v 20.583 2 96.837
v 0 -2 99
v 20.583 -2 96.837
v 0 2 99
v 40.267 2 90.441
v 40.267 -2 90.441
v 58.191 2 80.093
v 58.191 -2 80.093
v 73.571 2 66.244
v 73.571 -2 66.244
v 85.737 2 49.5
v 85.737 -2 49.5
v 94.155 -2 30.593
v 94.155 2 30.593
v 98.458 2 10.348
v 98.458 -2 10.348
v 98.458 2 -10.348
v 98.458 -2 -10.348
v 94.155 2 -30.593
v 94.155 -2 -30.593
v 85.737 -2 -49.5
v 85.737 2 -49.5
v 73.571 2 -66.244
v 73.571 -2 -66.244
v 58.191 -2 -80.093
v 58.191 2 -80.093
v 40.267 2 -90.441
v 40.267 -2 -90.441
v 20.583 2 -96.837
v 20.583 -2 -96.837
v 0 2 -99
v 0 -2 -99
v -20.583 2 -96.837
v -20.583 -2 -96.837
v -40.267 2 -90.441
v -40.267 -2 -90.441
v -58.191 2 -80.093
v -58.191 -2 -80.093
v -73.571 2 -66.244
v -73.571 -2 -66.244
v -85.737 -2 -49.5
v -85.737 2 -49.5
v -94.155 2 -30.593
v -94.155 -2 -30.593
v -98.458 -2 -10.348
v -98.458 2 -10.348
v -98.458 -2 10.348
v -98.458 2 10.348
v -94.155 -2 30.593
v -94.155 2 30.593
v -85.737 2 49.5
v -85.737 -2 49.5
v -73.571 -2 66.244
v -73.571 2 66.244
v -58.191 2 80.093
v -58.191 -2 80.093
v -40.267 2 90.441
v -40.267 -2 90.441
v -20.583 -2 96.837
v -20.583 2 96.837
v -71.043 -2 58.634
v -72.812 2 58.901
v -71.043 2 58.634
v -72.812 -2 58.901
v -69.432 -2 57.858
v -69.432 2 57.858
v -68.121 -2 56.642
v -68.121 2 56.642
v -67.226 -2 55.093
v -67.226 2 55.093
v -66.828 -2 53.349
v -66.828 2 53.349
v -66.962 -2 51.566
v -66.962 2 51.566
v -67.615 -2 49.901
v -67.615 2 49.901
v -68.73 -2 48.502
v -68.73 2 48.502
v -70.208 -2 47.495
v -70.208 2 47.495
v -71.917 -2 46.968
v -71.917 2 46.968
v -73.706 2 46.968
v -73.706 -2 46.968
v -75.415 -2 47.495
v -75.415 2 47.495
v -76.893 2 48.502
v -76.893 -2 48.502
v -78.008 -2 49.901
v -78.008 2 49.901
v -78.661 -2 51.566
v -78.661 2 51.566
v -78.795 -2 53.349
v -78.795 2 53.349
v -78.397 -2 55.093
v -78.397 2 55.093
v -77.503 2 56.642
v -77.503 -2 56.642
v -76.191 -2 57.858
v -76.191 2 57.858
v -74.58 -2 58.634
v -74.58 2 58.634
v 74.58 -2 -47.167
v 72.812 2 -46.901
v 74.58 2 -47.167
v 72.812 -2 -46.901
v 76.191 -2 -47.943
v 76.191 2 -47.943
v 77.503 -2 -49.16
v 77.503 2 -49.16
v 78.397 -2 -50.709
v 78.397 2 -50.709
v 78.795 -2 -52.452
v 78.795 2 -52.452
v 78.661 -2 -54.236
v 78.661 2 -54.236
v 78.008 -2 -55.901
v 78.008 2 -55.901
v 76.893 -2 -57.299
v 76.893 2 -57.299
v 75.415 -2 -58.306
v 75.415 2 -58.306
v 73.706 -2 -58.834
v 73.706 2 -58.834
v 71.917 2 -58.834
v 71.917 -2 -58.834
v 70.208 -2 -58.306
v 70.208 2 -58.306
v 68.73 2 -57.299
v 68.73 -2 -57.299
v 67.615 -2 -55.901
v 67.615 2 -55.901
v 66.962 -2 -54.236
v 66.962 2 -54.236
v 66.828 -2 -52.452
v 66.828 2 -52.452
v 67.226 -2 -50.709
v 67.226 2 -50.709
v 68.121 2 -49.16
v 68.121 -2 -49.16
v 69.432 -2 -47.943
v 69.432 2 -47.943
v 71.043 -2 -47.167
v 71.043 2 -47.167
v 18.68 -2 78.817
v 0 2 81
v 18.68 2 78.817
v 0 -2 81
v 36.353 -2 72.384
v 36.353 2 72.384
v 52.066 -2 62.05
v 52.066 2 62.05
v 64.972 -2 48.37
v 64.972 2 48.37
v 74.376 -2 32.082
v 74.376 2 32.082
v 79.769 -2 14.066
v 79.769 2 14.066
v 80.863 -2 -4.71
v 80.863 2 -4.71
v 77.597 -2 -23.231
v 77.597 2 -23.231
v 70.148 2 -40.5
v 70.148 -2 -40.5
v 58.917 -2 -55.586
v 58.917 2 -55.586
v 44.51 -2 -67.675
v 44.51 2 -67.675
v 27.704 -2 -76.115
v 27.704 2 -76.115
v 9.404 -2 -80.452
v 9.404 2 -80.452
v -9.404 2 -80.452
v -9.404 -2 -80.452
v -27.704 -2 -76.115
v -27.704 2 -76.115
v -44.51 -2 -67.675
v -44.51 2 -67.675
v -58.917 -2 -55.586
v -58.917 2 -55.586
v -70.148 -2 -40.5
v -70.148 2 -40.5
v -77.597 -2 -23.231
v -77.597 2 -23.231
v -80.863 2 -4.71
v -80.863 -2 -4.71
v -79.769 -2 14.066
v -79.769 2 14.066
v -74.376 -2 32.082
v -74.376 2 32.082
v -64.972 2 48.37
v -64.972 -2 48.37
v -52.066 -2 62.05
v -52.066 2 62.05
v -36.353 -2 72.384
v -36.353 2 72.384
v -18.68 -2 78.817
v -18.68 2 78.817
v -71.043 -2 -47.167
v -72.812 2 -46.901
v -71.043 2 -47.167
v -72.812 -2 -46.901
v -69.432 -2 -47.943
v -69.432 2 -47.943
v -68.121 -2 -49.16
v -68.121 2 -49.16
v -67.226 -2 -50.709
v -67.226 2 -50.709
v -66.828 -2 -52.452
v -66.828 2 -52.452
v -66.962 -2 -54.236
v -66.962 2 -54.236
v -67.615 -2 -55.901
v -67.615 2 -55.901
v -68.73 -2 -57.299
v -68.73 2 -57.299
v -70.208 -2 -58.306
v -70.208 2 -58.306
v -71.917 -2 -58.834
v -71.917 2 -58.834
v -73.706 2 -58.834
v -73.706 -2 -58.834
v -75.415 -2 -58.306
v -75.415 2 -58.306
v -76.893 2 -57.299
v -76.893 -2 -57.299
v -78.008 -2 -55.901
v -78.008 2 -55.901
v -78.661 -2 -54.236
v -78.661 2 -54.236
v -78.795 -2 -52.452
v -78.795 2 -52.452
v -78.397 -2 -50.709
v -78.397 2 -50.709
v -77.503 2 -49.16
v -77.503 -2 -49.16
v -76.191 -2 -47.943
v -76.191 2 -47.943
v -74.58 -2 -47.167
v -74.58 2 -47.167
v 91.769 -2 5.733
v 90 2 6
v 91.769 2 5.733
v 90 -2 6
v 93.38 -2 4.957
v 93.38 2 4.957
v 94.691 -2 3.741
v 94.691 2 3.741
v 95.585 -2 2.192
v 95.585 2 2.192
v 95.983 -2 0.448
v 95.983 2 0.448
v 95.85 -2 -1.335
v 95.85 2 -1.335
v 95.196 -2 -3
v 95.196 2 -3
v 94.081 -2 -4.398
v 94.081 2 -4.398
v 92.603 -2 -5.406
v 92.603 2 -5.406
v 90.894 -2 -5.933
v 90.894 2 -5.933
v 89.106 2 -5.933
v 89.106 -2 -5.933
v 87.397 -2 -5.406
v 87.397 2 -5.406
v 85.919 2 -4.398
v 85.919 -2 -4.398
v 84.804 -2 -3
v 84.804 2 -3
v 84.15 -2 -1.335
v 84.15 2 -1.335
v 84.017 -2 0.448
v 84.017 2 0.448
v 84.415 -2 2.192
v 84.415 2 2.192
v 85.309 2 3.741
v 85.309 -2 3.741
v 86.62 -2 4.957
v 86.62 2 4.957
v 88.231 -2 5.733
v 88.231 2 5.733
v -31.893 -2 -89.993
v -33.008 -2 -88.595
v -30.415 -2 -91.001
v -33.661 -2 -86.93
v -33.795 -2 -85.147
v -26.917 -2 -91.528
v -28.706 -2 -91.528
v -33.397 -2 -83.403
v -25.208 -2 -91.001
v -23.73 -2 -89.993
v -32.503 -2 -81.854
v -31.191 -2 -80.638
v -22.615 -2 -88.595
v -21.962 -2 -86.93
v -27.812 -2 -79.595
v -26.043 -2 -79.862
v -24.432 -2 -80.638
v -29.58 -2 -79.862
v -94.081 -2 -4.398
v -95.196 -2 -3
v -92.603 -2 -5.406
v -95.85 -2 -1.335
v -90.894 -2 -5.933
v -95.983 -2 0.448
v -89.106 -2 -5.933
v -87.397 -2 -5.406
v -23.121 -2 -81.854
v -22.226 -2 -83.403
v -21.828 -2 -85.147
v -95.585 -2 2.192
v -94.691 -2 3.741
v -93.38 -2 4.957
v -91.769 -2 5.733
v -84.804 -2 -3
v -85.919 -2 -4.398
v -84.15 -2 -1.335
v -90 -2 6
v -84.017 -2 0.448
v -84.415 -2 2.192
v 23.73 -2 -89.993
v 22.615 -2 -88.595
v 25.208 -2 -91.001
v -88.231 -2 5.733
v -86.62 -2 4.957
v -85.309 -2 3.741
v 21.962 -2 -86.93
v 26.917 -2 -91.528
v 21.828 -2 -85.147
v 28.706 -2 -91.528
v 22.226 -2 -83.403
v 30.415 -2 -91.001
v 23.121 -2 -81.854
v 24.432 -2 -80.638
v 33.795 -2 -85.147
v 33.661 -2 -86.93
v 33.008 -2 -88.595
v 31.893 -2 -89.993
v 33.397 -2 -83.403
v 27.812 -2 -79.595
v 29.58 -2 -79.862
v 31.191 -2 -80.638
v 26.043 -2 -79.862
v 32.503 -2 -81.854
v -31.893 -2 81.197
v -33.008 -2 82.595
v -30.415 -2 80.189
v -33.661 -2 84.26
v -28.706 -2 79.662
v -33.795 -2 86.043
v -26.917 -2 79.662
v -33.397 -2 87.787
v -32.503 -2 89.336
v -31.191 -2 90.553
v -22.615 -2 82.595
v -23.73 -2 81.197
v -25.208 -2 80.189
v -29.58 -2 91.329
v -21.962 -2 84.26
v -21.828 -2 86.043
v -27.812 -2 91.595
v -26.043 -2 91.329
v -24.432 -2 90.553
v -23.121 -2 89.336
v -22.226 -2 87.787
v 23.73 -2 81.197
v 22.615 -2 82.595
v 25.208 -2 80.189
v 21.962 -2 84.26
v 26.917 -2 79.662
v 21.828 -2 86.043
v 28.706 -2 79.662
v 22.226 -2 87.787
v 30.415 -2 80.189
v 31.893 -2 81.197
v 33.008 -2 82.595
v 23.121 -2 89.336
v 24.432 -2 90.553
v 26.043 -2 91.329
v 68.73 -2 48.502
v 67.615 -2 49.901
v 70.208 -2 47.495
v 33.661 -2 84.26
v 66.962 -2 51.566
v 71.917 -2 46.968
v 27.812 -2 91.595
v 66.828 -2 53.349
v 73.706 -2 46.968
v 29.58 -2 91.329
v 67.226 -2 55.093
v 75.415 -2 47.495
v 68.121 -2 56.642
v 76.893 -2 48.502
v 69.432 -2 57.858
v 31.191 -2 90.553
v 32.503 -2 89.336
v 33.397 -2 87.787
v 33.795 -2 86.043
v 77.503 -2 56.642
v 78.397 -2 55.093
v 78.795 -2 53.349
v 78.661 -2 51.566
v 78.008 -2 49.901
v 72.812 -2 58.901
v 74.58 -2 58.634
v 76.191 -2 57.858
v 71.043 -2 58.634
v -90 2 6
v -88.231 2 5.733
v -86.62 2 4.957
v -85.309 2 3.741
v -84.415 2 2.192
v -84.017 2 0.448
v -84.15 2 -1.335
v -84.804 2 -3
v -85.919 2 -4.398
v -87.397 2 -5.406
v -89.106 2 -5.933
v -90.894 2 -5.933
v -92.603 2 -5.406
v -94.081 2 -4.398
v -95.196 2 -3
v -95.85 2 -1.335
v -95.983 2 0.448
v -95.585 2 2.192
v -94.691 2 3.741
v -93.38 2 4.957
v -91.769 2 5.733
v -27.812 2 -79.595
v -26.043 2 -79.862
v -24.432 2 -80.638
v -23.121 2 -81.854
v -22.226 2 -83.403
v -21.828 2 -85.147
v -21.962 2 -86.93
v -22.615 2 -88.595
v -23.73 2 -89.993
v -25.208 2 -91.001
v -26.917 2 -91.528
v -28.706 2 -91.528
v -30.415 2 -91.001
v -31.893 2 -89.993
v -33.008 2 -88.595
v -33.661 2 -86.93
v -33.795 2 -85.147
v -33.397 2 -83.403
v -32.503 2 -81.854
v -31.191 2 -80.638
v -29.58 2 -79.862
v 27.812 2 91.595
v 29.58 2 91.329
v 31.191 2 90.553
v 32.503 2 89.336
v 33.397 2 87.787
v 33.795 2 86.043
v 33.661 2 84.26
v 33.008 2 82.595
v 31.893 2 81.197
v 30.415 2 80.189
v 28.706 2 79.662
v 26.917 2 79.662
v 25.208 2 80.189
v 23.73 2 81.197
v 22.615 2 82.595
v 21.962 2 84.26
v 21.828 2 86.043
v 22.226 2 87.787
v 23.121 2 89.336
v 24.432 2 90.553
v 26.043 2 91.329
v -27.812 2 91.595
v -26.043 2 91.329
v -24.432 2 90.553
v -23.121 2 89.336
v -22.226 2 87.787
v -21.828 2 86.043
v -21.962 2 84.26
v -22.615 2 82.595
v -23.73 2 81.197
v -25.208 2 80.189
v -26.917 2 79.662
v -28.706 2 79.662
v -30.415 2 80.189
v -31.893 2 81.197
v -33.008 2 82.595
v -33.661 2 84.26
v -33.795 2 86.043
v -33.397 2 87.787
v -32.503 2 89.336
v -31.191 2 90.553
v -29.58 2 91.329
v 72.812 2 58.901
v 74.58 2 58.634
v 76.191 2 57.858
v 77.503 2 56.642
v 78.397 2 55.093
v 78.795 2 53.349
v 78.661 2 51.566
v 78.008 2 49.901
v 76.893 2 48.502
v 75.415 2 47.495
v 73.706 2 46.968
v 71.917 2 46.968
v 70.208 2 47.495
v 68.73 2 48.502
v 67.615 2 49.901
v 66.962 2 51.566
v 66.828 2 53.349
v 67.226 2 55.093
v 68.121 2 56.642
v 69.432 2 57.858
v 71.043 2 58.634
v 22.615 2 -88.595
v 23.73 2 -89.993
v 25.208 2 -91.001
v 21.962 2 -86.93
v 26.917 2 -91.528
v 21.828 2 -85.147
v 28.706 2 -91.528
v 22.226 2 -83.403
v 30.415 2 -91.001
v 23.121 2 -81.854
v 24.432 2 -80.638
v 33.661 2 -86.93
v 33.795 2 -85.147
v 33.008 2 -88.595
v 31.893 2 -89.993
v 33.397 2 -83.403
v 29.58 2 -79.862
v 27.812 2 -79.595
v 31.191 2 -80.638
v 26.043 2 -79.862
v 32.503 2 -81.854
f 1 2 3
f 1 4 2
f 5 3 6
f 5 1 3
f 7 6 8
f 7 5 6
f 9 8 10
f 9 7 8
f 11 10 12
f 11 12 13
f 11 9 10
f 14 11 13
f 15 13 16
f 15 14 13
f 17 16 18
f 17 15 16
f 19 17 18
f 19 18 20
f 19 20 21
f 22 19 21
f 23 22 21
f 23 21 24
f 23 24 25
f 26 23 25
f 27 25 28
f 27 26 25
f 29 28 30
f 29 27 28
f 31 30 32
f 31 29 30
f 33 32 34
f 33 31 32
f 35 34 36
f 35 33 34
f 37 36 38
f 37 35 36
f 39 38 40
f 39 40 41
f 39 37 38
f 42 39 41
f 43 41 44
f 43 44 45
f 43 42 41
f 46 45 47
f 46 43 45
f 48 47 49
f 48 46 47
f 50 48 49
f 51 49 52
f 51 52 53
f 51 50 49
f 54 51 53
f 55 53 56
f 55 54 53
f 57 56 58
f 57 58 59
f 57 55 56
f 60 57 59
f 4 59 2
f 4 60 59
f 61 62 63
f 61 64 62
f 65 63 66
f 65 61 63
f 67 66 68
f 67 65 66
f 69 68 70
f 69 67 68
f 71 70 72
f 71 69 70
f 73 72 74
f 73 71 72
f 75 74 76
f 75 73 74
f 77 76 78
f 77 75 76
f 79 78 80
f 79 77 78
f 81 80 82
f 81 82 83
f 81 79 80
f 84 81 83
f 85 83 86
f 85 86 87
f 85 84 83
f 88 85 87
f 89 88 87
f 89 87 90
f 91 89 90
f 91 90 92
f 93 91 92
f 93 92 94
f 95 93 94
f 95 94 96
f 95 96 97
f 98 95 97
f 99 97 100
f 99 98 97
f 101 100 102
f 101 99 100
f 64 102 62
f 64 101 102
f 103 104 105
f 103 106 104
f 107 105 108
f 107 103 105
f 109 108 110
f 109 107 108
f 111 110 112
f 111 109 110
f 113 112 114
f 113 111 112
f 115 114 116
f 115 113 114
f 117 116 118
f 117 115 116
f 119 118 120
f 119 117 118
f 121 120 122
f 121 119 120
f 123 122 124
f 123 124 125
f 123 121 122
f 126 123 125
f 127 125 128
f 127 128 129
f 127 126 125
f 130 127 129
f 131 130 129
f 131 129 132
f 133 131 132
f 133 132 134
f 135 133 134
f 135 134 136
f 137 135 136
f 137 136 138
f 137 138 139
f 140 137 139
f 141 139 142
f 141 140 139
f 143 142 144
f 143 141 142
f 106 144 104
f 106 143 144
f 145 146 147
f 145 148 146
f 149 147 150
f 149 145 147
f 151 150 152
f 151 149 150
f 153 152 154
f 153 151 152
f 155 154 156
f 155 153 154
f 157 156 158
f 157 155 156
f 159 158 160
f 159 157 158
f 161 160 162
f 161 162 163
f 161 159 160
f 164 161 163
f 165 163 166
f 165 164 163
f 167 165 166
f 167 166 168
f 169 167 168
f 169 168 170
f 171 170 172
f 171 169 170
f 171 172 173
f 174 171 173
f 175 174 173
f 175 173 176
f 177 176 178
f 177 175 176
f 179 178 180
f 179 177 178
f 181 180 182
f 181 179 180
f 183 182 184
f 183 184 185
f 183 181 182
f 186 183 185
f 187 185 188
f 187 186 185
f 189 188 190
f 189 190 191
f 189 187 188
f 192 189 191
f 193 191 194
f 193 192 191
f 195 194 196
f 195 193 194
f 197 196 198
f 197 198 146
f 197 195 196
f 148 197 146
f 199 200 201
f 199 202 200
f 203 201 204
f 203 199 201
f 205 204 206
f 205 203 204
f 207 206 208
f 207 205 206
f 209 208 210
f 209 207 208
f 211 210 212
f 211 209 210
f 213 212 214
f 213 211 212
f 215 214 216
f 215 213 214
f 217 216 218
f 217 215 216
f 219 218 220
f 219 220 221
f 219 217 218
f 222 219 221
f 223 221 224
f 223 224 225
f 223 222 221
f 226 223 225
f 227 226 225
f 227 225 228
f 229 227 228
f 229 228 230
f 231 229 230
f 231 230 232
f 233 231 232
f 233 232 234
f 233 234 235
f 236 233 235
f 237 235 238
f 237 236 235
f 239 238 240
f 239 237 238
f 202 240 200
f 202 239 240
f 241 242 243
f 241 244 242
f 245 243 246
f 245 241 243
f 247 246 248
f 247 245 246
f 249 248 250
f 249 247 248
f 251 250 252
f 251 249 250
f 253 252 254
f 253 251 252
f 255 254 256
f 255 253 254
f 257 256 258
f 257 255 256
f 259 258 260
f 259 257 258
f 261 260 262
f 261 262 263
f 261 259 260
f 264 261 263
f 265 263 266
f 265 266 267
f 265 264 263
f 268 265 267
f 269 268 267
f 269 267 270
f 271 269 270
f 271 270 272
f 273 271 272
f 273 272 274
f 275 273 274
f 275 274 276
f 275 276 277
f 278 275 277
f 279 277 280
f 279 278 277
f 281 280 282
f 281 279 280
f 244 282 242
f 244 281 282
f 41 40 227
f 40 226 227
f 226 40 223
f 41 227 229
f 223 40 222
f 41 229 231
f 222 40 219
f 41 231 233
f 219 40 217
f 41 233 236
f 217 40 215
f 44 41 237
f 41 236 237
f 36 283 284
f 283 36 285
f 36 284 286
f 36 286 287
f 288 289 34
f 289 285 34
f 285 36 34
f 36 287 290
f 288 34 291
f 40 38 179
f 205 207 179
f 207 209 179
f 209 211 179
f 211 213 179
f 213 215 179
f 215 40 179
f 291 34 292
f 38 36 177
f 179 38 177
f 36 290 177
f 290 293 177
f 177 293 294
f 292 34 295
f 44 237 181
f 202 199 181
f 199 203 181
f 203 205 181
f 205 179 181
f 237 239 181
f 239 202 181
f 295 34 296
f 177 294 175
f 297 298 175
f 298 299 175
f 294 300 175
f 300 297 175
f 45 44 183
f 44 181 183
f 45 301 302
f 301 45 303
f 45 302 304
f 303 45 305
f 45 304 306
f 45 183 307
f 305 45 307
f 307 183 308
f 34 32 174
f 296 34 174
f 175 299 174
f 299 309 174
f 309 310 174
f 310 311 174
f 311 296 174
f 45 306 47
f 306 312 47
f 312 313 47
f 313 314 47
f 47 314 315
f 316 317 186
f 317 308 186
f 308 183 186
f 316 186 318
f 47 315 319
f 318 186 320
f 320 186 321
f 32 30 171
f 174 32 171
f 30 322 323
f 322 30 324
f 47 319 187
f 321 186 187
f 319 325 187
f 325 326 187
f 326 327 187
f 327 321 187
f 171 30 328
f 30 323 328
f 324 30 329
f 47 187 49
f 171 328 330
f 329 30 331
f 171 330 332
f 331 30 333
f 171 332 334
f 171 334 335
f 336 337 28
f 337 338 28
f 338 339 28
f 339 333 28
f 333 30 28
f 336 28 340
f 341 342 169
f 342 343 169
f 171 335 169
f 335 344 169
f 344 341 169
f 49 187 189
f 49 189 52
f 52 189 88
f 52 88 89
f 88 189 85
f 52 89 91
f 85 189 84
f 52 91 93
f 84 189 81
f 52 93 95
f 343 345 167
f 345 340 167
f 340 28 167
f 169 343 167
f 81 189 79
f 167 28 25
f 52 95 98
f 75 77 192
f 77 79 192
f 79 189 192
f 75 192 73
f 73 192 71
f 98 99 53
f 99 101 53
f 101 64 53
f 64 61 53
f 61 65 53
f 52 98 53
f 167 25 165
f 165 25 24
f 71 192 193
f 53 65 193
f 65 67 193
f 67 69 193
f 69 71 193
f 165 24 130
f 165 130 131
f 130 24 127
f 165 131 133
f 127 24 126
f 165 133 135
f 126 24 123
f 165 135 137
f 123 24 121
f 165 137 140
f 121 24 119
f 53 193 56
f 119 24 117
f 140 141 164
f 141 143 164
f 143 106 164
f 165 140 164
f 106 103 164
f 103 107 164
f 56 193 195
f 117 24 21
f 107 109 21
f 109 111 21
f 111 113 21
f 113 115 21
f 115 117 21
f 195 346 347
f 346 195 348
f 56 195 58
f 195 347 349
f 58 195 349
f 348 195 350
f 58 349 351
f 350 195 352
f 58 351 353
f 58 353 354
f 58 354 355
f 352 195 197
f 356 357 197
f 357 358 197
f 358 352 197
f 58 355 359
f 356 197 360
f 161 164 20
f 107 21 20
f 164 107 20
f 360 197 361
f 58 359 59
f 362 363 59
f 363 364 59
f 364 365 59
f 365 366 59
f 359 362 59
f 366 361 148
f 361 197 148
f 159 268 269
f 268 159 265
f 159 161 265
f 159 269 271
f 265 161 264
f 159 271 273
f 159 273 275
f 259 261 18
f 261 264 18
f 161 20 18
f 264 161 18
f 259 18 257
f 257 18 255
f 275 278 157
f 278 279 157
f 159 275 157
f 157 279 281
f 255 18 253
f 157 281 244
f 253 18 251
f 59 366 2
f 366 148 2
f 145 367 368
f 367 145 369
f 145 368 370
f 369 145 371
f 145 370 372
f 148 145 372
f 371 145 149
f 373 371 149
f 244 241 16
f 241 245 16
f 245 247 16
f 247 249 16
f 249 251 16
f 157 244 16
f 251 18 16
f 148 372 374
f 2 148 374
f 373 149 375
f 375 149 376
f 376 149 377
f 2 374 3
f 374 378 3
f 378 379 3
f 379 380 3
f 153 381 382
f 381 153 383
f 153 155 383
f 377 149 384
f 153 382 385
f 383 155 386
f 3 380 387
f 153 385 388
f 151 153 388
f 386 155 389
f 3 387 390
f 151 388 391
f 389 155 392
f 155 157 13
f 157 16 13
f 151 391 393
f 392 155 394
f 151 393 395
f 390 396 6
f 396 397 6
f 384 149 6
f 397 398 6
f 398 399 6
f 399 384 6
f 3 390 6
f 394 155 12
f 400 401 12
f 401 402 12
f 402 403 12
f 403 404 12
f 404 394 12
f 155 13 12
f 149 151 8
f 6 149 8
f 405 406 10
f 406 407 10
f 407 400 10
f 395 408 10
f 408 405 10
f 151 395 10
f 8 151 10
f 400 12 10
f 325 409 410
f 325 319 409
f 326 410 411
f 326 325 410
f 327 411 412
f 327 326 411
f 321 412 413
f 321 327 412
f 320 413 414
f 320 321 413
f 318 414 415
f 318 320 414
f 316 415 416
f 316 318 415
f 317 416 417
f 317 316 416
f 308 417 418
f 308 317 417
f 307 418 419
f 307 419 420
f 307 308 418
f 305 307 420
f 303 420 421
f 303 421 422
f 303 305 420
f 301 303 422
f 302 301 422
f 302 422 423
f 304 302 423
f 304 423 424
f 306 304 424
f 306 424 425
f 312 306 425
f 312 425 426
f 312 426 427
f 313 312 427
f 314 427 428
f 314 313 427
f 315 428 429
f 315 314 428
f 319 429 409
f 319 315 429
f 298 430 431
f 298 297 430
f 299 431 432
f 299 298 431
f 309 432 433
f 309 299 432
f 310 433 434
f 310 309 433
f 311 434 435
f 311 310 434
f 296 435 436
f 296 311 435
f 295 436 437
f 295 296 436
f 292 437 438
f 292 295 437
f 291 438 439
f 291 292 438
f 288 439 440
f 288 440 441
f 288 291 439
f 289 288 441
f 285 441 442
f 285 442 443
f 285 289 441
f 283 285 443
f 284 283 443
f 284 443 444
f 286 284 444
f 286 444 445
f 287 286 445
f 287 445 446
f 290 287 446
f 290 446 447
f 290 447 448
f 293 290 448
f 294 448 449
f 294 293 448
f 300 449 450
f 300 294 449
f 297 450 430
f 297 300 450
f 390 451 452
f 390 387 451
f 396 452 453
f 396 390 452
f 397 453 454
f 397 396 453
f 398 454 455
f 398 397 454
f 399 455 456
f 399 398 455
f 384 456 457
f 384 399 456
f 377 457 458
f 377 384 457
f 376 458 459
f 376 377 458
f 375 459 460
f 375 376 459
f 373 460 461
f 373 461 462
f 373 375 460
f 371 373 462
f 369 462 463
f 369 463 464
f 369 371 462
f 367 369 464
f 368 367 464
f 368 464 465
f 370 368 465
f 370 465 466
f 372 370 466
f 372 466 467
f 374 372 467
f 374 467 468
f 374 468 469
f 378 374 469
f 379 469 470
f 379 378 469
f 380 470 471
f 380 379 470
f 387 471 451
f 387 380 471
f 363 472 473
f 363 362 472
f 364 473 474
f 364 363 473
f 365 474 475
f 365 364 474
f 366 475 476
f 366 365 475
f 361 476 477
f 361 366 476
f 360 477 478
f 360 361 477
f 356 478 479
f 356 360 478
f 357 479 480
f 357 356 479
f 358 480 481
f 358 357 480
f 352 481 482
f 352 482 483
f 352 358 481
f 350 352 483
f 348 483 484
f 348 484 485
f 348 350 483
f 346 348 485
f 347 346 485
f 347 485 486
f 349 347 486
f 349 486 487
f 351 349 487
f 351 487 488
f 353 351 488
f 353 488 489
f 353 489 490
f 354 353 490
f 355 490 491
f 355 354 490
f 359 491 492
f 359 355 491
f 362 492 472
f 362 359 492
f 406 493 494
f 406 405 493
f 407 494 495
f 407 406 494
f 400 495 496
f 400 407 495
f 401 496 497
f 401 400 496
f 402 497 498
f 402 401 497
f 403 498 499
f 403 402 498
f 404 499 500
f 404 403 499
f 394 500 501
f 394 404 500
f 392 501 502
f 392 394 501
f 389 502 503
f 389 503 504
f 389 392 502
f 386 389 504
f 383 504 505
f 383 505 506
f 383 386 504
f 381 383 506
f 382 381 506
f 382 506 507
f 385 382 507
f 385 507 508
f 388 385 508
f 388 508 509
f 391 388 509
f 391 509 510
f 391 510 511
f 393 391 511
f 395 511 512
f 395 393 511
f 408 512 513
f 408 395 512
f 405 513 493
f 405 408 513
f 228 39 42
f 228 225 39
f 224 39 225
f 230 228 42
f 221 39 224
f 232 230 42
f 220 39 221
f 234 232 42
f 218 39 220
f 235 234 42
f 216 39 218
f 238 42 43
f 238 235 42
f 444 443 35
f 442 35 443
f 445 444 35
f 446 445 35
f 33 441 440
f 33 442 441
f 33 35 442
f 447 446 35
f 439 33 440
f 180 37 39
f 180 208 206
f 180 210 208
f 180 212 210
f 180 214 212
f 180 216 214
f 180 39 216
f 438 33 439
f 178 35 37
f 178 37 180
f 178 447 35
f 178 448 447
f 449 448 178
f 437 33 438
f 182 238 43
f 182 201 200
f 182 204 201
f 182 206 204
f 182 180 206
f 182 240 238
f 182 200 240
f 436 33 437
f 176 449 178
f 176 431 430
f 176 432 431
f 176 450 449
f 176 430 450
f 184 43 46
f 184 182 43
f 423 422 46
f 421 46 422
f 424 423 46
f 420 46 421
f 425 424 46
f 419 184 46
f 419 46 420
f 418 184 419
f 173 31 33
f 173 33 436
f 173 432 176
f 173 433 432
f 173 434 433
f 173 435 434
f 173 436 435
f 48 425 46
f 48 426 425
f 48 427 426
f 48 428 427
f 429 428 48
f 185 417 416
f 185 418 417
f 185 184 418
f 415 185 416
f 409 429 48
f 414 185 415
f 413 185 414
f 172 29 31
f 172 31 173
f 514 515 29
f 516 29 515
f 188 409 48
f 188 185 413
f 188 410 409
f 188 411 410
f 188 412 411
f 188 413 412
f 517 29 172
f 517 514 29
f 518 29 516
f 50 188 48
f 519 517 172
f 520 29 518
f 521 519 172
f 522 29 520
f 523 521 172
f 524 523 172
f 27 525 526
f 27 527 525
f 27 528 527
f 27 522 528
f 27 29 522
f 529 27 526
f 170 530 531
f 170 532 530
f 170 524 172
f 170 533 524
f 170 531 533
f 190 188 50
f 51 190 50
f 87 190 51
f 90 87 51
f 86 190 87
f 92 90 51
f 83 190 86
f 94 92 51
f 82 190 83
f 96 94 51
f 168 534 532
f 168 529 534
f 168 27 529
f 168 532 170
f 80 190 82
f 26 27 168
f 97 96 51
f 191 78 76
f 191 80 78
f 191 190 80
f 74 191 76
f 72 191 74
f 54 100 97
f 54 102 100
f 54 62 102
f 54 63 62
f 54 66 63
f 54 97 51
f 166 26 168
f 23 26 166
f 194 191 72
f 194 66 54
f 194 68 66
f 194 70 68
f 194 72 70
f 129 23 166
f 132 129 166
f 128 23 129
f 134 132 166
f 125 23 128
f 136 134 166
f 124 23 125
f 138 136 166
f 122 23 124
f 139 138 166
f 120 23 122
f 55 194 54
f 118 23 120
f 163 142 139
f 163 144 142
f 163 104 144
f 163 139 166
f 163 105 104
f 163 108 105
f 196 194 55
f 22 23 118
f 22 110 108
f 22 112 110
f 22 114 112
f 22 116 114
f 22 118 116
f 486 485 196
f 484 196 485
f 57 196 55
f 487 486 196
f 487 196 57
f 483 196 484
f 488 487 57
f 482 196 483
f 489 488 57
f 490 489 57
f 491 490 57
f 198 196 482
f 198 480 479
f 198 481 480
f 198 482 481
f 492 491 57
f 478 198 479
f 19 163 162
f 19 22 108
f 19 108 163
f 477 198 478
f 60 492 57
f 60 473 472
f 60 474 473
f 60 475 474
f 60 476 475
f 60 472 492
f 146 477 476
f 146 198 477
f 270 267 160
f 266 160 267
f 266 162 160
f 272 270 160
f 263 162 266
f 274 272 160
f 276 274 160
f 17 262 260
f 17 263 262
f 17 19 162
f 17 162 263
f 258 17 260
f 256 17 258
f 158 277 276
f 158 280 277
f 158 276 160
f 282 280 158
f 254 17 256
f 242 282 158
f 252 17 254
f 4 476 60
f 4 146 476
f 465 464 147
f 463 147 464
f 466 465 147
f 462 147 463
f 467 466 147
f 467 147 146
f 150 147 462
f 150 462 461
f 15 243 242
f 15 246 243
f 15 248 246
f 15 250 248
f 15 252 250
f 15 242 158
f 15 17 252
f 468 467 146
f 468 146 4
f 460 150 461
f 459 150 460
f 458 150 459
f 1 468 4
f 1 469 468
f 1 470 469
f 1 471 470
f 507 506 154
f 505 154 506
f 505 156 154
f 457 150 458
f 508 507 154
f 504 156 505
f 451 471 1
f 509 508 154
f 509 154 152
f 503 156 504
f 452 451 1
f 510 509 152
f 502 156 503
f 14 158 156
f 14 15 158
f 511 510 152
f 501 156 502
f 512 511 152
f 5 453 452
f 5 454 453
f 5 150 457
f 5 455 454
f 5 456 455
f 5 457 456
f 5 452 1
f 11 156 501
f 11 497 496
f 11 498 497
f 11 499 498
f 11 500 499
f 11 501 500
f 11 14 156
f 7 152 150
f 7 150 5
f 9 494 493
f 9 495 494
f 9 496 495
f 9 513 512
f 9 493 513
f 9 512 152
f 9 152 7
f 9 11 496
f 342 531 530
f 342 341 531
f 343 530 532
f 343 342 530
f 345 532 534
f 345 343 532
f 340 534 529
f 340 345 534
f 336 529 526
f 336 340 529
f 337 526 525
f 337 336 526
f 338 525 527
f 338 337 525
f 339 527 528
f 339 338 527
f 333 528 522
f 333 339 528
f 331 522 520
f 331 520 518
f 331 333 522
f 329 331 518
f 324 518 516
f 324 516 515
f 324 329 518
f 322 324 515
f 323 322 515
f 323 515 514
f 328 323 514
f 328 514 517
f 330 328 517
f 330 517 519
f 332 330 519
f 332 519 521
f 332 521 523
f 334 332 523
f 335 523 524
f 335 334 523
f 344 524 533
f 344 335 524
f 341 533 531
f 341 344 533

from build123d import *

# Parameters (mm, degrees)
SKETCH1_R           = 99
SKETCH1_R_2         = 6
SKETCH1_R_3         = 81
BOSS_EXTRUDE1_DEPTH = 2


with BuildPart() as part:
    # Sketch1 → Boss-Extrude1 (new, symmetric)
    with BuildSketch(Plane(origin=(0, 0, 0), x_dir=(1, 0, 0), z_dir=(0, 1, 0))):
        Circle(SKETCH1_R)
        with Locations((90, 0)):
            Circle(SKETCH1_R_2, mode=Mode.SUBTRACT)
        with Locations((72.811529494, -52.900672706)):
            Circle(SKETCH1_R_2, mode=Mode.SUBTRACT)
        with Locations((27.811529494, -85.595086467)):
            Circle(SKETCH1_R_2, mode=Mode.SUBTRACT)
        with Locations((-27.811529494, -85.595086467)):
            Circle(SKETCH1_R_2, mode=Mode.SUBTRACT)
        with Locations((-72.811529494, -52.900672706)):
            Circle(SKETCH1_R_2, mode=Mode.SUBTRACT)
        with Locations((-90, 0)):
            Circle(SKETCH1_R_2, mode=Mode.SUBTRACT)
        with Locations((-72.811529494, 52.900672706)):
            Circle(SKETCH1_R_2, mode=Mode.SUBTRACT)
        with Locations((-27.811529494, 85.595086467)):
            Circle(SKETCH1_R_2, mode=Mode.SUBTRACT)
        with Locations((27.811529494, 85.595086467)):
            Circle(SKETCH1_R_2, mode=Mode.SUBTRACT)
        with Locations((72.811529494, 52.900672706)):
            Circle(SKETCH1_R_2, mode=Mode.SUBTRACT)
        Circle(SKETCH1_R_3, mode=Mode.SUBTRACT)
    extrude(amount=BOSS_EXTRUDE1_DEPTH, both=True)


solid = part.part
